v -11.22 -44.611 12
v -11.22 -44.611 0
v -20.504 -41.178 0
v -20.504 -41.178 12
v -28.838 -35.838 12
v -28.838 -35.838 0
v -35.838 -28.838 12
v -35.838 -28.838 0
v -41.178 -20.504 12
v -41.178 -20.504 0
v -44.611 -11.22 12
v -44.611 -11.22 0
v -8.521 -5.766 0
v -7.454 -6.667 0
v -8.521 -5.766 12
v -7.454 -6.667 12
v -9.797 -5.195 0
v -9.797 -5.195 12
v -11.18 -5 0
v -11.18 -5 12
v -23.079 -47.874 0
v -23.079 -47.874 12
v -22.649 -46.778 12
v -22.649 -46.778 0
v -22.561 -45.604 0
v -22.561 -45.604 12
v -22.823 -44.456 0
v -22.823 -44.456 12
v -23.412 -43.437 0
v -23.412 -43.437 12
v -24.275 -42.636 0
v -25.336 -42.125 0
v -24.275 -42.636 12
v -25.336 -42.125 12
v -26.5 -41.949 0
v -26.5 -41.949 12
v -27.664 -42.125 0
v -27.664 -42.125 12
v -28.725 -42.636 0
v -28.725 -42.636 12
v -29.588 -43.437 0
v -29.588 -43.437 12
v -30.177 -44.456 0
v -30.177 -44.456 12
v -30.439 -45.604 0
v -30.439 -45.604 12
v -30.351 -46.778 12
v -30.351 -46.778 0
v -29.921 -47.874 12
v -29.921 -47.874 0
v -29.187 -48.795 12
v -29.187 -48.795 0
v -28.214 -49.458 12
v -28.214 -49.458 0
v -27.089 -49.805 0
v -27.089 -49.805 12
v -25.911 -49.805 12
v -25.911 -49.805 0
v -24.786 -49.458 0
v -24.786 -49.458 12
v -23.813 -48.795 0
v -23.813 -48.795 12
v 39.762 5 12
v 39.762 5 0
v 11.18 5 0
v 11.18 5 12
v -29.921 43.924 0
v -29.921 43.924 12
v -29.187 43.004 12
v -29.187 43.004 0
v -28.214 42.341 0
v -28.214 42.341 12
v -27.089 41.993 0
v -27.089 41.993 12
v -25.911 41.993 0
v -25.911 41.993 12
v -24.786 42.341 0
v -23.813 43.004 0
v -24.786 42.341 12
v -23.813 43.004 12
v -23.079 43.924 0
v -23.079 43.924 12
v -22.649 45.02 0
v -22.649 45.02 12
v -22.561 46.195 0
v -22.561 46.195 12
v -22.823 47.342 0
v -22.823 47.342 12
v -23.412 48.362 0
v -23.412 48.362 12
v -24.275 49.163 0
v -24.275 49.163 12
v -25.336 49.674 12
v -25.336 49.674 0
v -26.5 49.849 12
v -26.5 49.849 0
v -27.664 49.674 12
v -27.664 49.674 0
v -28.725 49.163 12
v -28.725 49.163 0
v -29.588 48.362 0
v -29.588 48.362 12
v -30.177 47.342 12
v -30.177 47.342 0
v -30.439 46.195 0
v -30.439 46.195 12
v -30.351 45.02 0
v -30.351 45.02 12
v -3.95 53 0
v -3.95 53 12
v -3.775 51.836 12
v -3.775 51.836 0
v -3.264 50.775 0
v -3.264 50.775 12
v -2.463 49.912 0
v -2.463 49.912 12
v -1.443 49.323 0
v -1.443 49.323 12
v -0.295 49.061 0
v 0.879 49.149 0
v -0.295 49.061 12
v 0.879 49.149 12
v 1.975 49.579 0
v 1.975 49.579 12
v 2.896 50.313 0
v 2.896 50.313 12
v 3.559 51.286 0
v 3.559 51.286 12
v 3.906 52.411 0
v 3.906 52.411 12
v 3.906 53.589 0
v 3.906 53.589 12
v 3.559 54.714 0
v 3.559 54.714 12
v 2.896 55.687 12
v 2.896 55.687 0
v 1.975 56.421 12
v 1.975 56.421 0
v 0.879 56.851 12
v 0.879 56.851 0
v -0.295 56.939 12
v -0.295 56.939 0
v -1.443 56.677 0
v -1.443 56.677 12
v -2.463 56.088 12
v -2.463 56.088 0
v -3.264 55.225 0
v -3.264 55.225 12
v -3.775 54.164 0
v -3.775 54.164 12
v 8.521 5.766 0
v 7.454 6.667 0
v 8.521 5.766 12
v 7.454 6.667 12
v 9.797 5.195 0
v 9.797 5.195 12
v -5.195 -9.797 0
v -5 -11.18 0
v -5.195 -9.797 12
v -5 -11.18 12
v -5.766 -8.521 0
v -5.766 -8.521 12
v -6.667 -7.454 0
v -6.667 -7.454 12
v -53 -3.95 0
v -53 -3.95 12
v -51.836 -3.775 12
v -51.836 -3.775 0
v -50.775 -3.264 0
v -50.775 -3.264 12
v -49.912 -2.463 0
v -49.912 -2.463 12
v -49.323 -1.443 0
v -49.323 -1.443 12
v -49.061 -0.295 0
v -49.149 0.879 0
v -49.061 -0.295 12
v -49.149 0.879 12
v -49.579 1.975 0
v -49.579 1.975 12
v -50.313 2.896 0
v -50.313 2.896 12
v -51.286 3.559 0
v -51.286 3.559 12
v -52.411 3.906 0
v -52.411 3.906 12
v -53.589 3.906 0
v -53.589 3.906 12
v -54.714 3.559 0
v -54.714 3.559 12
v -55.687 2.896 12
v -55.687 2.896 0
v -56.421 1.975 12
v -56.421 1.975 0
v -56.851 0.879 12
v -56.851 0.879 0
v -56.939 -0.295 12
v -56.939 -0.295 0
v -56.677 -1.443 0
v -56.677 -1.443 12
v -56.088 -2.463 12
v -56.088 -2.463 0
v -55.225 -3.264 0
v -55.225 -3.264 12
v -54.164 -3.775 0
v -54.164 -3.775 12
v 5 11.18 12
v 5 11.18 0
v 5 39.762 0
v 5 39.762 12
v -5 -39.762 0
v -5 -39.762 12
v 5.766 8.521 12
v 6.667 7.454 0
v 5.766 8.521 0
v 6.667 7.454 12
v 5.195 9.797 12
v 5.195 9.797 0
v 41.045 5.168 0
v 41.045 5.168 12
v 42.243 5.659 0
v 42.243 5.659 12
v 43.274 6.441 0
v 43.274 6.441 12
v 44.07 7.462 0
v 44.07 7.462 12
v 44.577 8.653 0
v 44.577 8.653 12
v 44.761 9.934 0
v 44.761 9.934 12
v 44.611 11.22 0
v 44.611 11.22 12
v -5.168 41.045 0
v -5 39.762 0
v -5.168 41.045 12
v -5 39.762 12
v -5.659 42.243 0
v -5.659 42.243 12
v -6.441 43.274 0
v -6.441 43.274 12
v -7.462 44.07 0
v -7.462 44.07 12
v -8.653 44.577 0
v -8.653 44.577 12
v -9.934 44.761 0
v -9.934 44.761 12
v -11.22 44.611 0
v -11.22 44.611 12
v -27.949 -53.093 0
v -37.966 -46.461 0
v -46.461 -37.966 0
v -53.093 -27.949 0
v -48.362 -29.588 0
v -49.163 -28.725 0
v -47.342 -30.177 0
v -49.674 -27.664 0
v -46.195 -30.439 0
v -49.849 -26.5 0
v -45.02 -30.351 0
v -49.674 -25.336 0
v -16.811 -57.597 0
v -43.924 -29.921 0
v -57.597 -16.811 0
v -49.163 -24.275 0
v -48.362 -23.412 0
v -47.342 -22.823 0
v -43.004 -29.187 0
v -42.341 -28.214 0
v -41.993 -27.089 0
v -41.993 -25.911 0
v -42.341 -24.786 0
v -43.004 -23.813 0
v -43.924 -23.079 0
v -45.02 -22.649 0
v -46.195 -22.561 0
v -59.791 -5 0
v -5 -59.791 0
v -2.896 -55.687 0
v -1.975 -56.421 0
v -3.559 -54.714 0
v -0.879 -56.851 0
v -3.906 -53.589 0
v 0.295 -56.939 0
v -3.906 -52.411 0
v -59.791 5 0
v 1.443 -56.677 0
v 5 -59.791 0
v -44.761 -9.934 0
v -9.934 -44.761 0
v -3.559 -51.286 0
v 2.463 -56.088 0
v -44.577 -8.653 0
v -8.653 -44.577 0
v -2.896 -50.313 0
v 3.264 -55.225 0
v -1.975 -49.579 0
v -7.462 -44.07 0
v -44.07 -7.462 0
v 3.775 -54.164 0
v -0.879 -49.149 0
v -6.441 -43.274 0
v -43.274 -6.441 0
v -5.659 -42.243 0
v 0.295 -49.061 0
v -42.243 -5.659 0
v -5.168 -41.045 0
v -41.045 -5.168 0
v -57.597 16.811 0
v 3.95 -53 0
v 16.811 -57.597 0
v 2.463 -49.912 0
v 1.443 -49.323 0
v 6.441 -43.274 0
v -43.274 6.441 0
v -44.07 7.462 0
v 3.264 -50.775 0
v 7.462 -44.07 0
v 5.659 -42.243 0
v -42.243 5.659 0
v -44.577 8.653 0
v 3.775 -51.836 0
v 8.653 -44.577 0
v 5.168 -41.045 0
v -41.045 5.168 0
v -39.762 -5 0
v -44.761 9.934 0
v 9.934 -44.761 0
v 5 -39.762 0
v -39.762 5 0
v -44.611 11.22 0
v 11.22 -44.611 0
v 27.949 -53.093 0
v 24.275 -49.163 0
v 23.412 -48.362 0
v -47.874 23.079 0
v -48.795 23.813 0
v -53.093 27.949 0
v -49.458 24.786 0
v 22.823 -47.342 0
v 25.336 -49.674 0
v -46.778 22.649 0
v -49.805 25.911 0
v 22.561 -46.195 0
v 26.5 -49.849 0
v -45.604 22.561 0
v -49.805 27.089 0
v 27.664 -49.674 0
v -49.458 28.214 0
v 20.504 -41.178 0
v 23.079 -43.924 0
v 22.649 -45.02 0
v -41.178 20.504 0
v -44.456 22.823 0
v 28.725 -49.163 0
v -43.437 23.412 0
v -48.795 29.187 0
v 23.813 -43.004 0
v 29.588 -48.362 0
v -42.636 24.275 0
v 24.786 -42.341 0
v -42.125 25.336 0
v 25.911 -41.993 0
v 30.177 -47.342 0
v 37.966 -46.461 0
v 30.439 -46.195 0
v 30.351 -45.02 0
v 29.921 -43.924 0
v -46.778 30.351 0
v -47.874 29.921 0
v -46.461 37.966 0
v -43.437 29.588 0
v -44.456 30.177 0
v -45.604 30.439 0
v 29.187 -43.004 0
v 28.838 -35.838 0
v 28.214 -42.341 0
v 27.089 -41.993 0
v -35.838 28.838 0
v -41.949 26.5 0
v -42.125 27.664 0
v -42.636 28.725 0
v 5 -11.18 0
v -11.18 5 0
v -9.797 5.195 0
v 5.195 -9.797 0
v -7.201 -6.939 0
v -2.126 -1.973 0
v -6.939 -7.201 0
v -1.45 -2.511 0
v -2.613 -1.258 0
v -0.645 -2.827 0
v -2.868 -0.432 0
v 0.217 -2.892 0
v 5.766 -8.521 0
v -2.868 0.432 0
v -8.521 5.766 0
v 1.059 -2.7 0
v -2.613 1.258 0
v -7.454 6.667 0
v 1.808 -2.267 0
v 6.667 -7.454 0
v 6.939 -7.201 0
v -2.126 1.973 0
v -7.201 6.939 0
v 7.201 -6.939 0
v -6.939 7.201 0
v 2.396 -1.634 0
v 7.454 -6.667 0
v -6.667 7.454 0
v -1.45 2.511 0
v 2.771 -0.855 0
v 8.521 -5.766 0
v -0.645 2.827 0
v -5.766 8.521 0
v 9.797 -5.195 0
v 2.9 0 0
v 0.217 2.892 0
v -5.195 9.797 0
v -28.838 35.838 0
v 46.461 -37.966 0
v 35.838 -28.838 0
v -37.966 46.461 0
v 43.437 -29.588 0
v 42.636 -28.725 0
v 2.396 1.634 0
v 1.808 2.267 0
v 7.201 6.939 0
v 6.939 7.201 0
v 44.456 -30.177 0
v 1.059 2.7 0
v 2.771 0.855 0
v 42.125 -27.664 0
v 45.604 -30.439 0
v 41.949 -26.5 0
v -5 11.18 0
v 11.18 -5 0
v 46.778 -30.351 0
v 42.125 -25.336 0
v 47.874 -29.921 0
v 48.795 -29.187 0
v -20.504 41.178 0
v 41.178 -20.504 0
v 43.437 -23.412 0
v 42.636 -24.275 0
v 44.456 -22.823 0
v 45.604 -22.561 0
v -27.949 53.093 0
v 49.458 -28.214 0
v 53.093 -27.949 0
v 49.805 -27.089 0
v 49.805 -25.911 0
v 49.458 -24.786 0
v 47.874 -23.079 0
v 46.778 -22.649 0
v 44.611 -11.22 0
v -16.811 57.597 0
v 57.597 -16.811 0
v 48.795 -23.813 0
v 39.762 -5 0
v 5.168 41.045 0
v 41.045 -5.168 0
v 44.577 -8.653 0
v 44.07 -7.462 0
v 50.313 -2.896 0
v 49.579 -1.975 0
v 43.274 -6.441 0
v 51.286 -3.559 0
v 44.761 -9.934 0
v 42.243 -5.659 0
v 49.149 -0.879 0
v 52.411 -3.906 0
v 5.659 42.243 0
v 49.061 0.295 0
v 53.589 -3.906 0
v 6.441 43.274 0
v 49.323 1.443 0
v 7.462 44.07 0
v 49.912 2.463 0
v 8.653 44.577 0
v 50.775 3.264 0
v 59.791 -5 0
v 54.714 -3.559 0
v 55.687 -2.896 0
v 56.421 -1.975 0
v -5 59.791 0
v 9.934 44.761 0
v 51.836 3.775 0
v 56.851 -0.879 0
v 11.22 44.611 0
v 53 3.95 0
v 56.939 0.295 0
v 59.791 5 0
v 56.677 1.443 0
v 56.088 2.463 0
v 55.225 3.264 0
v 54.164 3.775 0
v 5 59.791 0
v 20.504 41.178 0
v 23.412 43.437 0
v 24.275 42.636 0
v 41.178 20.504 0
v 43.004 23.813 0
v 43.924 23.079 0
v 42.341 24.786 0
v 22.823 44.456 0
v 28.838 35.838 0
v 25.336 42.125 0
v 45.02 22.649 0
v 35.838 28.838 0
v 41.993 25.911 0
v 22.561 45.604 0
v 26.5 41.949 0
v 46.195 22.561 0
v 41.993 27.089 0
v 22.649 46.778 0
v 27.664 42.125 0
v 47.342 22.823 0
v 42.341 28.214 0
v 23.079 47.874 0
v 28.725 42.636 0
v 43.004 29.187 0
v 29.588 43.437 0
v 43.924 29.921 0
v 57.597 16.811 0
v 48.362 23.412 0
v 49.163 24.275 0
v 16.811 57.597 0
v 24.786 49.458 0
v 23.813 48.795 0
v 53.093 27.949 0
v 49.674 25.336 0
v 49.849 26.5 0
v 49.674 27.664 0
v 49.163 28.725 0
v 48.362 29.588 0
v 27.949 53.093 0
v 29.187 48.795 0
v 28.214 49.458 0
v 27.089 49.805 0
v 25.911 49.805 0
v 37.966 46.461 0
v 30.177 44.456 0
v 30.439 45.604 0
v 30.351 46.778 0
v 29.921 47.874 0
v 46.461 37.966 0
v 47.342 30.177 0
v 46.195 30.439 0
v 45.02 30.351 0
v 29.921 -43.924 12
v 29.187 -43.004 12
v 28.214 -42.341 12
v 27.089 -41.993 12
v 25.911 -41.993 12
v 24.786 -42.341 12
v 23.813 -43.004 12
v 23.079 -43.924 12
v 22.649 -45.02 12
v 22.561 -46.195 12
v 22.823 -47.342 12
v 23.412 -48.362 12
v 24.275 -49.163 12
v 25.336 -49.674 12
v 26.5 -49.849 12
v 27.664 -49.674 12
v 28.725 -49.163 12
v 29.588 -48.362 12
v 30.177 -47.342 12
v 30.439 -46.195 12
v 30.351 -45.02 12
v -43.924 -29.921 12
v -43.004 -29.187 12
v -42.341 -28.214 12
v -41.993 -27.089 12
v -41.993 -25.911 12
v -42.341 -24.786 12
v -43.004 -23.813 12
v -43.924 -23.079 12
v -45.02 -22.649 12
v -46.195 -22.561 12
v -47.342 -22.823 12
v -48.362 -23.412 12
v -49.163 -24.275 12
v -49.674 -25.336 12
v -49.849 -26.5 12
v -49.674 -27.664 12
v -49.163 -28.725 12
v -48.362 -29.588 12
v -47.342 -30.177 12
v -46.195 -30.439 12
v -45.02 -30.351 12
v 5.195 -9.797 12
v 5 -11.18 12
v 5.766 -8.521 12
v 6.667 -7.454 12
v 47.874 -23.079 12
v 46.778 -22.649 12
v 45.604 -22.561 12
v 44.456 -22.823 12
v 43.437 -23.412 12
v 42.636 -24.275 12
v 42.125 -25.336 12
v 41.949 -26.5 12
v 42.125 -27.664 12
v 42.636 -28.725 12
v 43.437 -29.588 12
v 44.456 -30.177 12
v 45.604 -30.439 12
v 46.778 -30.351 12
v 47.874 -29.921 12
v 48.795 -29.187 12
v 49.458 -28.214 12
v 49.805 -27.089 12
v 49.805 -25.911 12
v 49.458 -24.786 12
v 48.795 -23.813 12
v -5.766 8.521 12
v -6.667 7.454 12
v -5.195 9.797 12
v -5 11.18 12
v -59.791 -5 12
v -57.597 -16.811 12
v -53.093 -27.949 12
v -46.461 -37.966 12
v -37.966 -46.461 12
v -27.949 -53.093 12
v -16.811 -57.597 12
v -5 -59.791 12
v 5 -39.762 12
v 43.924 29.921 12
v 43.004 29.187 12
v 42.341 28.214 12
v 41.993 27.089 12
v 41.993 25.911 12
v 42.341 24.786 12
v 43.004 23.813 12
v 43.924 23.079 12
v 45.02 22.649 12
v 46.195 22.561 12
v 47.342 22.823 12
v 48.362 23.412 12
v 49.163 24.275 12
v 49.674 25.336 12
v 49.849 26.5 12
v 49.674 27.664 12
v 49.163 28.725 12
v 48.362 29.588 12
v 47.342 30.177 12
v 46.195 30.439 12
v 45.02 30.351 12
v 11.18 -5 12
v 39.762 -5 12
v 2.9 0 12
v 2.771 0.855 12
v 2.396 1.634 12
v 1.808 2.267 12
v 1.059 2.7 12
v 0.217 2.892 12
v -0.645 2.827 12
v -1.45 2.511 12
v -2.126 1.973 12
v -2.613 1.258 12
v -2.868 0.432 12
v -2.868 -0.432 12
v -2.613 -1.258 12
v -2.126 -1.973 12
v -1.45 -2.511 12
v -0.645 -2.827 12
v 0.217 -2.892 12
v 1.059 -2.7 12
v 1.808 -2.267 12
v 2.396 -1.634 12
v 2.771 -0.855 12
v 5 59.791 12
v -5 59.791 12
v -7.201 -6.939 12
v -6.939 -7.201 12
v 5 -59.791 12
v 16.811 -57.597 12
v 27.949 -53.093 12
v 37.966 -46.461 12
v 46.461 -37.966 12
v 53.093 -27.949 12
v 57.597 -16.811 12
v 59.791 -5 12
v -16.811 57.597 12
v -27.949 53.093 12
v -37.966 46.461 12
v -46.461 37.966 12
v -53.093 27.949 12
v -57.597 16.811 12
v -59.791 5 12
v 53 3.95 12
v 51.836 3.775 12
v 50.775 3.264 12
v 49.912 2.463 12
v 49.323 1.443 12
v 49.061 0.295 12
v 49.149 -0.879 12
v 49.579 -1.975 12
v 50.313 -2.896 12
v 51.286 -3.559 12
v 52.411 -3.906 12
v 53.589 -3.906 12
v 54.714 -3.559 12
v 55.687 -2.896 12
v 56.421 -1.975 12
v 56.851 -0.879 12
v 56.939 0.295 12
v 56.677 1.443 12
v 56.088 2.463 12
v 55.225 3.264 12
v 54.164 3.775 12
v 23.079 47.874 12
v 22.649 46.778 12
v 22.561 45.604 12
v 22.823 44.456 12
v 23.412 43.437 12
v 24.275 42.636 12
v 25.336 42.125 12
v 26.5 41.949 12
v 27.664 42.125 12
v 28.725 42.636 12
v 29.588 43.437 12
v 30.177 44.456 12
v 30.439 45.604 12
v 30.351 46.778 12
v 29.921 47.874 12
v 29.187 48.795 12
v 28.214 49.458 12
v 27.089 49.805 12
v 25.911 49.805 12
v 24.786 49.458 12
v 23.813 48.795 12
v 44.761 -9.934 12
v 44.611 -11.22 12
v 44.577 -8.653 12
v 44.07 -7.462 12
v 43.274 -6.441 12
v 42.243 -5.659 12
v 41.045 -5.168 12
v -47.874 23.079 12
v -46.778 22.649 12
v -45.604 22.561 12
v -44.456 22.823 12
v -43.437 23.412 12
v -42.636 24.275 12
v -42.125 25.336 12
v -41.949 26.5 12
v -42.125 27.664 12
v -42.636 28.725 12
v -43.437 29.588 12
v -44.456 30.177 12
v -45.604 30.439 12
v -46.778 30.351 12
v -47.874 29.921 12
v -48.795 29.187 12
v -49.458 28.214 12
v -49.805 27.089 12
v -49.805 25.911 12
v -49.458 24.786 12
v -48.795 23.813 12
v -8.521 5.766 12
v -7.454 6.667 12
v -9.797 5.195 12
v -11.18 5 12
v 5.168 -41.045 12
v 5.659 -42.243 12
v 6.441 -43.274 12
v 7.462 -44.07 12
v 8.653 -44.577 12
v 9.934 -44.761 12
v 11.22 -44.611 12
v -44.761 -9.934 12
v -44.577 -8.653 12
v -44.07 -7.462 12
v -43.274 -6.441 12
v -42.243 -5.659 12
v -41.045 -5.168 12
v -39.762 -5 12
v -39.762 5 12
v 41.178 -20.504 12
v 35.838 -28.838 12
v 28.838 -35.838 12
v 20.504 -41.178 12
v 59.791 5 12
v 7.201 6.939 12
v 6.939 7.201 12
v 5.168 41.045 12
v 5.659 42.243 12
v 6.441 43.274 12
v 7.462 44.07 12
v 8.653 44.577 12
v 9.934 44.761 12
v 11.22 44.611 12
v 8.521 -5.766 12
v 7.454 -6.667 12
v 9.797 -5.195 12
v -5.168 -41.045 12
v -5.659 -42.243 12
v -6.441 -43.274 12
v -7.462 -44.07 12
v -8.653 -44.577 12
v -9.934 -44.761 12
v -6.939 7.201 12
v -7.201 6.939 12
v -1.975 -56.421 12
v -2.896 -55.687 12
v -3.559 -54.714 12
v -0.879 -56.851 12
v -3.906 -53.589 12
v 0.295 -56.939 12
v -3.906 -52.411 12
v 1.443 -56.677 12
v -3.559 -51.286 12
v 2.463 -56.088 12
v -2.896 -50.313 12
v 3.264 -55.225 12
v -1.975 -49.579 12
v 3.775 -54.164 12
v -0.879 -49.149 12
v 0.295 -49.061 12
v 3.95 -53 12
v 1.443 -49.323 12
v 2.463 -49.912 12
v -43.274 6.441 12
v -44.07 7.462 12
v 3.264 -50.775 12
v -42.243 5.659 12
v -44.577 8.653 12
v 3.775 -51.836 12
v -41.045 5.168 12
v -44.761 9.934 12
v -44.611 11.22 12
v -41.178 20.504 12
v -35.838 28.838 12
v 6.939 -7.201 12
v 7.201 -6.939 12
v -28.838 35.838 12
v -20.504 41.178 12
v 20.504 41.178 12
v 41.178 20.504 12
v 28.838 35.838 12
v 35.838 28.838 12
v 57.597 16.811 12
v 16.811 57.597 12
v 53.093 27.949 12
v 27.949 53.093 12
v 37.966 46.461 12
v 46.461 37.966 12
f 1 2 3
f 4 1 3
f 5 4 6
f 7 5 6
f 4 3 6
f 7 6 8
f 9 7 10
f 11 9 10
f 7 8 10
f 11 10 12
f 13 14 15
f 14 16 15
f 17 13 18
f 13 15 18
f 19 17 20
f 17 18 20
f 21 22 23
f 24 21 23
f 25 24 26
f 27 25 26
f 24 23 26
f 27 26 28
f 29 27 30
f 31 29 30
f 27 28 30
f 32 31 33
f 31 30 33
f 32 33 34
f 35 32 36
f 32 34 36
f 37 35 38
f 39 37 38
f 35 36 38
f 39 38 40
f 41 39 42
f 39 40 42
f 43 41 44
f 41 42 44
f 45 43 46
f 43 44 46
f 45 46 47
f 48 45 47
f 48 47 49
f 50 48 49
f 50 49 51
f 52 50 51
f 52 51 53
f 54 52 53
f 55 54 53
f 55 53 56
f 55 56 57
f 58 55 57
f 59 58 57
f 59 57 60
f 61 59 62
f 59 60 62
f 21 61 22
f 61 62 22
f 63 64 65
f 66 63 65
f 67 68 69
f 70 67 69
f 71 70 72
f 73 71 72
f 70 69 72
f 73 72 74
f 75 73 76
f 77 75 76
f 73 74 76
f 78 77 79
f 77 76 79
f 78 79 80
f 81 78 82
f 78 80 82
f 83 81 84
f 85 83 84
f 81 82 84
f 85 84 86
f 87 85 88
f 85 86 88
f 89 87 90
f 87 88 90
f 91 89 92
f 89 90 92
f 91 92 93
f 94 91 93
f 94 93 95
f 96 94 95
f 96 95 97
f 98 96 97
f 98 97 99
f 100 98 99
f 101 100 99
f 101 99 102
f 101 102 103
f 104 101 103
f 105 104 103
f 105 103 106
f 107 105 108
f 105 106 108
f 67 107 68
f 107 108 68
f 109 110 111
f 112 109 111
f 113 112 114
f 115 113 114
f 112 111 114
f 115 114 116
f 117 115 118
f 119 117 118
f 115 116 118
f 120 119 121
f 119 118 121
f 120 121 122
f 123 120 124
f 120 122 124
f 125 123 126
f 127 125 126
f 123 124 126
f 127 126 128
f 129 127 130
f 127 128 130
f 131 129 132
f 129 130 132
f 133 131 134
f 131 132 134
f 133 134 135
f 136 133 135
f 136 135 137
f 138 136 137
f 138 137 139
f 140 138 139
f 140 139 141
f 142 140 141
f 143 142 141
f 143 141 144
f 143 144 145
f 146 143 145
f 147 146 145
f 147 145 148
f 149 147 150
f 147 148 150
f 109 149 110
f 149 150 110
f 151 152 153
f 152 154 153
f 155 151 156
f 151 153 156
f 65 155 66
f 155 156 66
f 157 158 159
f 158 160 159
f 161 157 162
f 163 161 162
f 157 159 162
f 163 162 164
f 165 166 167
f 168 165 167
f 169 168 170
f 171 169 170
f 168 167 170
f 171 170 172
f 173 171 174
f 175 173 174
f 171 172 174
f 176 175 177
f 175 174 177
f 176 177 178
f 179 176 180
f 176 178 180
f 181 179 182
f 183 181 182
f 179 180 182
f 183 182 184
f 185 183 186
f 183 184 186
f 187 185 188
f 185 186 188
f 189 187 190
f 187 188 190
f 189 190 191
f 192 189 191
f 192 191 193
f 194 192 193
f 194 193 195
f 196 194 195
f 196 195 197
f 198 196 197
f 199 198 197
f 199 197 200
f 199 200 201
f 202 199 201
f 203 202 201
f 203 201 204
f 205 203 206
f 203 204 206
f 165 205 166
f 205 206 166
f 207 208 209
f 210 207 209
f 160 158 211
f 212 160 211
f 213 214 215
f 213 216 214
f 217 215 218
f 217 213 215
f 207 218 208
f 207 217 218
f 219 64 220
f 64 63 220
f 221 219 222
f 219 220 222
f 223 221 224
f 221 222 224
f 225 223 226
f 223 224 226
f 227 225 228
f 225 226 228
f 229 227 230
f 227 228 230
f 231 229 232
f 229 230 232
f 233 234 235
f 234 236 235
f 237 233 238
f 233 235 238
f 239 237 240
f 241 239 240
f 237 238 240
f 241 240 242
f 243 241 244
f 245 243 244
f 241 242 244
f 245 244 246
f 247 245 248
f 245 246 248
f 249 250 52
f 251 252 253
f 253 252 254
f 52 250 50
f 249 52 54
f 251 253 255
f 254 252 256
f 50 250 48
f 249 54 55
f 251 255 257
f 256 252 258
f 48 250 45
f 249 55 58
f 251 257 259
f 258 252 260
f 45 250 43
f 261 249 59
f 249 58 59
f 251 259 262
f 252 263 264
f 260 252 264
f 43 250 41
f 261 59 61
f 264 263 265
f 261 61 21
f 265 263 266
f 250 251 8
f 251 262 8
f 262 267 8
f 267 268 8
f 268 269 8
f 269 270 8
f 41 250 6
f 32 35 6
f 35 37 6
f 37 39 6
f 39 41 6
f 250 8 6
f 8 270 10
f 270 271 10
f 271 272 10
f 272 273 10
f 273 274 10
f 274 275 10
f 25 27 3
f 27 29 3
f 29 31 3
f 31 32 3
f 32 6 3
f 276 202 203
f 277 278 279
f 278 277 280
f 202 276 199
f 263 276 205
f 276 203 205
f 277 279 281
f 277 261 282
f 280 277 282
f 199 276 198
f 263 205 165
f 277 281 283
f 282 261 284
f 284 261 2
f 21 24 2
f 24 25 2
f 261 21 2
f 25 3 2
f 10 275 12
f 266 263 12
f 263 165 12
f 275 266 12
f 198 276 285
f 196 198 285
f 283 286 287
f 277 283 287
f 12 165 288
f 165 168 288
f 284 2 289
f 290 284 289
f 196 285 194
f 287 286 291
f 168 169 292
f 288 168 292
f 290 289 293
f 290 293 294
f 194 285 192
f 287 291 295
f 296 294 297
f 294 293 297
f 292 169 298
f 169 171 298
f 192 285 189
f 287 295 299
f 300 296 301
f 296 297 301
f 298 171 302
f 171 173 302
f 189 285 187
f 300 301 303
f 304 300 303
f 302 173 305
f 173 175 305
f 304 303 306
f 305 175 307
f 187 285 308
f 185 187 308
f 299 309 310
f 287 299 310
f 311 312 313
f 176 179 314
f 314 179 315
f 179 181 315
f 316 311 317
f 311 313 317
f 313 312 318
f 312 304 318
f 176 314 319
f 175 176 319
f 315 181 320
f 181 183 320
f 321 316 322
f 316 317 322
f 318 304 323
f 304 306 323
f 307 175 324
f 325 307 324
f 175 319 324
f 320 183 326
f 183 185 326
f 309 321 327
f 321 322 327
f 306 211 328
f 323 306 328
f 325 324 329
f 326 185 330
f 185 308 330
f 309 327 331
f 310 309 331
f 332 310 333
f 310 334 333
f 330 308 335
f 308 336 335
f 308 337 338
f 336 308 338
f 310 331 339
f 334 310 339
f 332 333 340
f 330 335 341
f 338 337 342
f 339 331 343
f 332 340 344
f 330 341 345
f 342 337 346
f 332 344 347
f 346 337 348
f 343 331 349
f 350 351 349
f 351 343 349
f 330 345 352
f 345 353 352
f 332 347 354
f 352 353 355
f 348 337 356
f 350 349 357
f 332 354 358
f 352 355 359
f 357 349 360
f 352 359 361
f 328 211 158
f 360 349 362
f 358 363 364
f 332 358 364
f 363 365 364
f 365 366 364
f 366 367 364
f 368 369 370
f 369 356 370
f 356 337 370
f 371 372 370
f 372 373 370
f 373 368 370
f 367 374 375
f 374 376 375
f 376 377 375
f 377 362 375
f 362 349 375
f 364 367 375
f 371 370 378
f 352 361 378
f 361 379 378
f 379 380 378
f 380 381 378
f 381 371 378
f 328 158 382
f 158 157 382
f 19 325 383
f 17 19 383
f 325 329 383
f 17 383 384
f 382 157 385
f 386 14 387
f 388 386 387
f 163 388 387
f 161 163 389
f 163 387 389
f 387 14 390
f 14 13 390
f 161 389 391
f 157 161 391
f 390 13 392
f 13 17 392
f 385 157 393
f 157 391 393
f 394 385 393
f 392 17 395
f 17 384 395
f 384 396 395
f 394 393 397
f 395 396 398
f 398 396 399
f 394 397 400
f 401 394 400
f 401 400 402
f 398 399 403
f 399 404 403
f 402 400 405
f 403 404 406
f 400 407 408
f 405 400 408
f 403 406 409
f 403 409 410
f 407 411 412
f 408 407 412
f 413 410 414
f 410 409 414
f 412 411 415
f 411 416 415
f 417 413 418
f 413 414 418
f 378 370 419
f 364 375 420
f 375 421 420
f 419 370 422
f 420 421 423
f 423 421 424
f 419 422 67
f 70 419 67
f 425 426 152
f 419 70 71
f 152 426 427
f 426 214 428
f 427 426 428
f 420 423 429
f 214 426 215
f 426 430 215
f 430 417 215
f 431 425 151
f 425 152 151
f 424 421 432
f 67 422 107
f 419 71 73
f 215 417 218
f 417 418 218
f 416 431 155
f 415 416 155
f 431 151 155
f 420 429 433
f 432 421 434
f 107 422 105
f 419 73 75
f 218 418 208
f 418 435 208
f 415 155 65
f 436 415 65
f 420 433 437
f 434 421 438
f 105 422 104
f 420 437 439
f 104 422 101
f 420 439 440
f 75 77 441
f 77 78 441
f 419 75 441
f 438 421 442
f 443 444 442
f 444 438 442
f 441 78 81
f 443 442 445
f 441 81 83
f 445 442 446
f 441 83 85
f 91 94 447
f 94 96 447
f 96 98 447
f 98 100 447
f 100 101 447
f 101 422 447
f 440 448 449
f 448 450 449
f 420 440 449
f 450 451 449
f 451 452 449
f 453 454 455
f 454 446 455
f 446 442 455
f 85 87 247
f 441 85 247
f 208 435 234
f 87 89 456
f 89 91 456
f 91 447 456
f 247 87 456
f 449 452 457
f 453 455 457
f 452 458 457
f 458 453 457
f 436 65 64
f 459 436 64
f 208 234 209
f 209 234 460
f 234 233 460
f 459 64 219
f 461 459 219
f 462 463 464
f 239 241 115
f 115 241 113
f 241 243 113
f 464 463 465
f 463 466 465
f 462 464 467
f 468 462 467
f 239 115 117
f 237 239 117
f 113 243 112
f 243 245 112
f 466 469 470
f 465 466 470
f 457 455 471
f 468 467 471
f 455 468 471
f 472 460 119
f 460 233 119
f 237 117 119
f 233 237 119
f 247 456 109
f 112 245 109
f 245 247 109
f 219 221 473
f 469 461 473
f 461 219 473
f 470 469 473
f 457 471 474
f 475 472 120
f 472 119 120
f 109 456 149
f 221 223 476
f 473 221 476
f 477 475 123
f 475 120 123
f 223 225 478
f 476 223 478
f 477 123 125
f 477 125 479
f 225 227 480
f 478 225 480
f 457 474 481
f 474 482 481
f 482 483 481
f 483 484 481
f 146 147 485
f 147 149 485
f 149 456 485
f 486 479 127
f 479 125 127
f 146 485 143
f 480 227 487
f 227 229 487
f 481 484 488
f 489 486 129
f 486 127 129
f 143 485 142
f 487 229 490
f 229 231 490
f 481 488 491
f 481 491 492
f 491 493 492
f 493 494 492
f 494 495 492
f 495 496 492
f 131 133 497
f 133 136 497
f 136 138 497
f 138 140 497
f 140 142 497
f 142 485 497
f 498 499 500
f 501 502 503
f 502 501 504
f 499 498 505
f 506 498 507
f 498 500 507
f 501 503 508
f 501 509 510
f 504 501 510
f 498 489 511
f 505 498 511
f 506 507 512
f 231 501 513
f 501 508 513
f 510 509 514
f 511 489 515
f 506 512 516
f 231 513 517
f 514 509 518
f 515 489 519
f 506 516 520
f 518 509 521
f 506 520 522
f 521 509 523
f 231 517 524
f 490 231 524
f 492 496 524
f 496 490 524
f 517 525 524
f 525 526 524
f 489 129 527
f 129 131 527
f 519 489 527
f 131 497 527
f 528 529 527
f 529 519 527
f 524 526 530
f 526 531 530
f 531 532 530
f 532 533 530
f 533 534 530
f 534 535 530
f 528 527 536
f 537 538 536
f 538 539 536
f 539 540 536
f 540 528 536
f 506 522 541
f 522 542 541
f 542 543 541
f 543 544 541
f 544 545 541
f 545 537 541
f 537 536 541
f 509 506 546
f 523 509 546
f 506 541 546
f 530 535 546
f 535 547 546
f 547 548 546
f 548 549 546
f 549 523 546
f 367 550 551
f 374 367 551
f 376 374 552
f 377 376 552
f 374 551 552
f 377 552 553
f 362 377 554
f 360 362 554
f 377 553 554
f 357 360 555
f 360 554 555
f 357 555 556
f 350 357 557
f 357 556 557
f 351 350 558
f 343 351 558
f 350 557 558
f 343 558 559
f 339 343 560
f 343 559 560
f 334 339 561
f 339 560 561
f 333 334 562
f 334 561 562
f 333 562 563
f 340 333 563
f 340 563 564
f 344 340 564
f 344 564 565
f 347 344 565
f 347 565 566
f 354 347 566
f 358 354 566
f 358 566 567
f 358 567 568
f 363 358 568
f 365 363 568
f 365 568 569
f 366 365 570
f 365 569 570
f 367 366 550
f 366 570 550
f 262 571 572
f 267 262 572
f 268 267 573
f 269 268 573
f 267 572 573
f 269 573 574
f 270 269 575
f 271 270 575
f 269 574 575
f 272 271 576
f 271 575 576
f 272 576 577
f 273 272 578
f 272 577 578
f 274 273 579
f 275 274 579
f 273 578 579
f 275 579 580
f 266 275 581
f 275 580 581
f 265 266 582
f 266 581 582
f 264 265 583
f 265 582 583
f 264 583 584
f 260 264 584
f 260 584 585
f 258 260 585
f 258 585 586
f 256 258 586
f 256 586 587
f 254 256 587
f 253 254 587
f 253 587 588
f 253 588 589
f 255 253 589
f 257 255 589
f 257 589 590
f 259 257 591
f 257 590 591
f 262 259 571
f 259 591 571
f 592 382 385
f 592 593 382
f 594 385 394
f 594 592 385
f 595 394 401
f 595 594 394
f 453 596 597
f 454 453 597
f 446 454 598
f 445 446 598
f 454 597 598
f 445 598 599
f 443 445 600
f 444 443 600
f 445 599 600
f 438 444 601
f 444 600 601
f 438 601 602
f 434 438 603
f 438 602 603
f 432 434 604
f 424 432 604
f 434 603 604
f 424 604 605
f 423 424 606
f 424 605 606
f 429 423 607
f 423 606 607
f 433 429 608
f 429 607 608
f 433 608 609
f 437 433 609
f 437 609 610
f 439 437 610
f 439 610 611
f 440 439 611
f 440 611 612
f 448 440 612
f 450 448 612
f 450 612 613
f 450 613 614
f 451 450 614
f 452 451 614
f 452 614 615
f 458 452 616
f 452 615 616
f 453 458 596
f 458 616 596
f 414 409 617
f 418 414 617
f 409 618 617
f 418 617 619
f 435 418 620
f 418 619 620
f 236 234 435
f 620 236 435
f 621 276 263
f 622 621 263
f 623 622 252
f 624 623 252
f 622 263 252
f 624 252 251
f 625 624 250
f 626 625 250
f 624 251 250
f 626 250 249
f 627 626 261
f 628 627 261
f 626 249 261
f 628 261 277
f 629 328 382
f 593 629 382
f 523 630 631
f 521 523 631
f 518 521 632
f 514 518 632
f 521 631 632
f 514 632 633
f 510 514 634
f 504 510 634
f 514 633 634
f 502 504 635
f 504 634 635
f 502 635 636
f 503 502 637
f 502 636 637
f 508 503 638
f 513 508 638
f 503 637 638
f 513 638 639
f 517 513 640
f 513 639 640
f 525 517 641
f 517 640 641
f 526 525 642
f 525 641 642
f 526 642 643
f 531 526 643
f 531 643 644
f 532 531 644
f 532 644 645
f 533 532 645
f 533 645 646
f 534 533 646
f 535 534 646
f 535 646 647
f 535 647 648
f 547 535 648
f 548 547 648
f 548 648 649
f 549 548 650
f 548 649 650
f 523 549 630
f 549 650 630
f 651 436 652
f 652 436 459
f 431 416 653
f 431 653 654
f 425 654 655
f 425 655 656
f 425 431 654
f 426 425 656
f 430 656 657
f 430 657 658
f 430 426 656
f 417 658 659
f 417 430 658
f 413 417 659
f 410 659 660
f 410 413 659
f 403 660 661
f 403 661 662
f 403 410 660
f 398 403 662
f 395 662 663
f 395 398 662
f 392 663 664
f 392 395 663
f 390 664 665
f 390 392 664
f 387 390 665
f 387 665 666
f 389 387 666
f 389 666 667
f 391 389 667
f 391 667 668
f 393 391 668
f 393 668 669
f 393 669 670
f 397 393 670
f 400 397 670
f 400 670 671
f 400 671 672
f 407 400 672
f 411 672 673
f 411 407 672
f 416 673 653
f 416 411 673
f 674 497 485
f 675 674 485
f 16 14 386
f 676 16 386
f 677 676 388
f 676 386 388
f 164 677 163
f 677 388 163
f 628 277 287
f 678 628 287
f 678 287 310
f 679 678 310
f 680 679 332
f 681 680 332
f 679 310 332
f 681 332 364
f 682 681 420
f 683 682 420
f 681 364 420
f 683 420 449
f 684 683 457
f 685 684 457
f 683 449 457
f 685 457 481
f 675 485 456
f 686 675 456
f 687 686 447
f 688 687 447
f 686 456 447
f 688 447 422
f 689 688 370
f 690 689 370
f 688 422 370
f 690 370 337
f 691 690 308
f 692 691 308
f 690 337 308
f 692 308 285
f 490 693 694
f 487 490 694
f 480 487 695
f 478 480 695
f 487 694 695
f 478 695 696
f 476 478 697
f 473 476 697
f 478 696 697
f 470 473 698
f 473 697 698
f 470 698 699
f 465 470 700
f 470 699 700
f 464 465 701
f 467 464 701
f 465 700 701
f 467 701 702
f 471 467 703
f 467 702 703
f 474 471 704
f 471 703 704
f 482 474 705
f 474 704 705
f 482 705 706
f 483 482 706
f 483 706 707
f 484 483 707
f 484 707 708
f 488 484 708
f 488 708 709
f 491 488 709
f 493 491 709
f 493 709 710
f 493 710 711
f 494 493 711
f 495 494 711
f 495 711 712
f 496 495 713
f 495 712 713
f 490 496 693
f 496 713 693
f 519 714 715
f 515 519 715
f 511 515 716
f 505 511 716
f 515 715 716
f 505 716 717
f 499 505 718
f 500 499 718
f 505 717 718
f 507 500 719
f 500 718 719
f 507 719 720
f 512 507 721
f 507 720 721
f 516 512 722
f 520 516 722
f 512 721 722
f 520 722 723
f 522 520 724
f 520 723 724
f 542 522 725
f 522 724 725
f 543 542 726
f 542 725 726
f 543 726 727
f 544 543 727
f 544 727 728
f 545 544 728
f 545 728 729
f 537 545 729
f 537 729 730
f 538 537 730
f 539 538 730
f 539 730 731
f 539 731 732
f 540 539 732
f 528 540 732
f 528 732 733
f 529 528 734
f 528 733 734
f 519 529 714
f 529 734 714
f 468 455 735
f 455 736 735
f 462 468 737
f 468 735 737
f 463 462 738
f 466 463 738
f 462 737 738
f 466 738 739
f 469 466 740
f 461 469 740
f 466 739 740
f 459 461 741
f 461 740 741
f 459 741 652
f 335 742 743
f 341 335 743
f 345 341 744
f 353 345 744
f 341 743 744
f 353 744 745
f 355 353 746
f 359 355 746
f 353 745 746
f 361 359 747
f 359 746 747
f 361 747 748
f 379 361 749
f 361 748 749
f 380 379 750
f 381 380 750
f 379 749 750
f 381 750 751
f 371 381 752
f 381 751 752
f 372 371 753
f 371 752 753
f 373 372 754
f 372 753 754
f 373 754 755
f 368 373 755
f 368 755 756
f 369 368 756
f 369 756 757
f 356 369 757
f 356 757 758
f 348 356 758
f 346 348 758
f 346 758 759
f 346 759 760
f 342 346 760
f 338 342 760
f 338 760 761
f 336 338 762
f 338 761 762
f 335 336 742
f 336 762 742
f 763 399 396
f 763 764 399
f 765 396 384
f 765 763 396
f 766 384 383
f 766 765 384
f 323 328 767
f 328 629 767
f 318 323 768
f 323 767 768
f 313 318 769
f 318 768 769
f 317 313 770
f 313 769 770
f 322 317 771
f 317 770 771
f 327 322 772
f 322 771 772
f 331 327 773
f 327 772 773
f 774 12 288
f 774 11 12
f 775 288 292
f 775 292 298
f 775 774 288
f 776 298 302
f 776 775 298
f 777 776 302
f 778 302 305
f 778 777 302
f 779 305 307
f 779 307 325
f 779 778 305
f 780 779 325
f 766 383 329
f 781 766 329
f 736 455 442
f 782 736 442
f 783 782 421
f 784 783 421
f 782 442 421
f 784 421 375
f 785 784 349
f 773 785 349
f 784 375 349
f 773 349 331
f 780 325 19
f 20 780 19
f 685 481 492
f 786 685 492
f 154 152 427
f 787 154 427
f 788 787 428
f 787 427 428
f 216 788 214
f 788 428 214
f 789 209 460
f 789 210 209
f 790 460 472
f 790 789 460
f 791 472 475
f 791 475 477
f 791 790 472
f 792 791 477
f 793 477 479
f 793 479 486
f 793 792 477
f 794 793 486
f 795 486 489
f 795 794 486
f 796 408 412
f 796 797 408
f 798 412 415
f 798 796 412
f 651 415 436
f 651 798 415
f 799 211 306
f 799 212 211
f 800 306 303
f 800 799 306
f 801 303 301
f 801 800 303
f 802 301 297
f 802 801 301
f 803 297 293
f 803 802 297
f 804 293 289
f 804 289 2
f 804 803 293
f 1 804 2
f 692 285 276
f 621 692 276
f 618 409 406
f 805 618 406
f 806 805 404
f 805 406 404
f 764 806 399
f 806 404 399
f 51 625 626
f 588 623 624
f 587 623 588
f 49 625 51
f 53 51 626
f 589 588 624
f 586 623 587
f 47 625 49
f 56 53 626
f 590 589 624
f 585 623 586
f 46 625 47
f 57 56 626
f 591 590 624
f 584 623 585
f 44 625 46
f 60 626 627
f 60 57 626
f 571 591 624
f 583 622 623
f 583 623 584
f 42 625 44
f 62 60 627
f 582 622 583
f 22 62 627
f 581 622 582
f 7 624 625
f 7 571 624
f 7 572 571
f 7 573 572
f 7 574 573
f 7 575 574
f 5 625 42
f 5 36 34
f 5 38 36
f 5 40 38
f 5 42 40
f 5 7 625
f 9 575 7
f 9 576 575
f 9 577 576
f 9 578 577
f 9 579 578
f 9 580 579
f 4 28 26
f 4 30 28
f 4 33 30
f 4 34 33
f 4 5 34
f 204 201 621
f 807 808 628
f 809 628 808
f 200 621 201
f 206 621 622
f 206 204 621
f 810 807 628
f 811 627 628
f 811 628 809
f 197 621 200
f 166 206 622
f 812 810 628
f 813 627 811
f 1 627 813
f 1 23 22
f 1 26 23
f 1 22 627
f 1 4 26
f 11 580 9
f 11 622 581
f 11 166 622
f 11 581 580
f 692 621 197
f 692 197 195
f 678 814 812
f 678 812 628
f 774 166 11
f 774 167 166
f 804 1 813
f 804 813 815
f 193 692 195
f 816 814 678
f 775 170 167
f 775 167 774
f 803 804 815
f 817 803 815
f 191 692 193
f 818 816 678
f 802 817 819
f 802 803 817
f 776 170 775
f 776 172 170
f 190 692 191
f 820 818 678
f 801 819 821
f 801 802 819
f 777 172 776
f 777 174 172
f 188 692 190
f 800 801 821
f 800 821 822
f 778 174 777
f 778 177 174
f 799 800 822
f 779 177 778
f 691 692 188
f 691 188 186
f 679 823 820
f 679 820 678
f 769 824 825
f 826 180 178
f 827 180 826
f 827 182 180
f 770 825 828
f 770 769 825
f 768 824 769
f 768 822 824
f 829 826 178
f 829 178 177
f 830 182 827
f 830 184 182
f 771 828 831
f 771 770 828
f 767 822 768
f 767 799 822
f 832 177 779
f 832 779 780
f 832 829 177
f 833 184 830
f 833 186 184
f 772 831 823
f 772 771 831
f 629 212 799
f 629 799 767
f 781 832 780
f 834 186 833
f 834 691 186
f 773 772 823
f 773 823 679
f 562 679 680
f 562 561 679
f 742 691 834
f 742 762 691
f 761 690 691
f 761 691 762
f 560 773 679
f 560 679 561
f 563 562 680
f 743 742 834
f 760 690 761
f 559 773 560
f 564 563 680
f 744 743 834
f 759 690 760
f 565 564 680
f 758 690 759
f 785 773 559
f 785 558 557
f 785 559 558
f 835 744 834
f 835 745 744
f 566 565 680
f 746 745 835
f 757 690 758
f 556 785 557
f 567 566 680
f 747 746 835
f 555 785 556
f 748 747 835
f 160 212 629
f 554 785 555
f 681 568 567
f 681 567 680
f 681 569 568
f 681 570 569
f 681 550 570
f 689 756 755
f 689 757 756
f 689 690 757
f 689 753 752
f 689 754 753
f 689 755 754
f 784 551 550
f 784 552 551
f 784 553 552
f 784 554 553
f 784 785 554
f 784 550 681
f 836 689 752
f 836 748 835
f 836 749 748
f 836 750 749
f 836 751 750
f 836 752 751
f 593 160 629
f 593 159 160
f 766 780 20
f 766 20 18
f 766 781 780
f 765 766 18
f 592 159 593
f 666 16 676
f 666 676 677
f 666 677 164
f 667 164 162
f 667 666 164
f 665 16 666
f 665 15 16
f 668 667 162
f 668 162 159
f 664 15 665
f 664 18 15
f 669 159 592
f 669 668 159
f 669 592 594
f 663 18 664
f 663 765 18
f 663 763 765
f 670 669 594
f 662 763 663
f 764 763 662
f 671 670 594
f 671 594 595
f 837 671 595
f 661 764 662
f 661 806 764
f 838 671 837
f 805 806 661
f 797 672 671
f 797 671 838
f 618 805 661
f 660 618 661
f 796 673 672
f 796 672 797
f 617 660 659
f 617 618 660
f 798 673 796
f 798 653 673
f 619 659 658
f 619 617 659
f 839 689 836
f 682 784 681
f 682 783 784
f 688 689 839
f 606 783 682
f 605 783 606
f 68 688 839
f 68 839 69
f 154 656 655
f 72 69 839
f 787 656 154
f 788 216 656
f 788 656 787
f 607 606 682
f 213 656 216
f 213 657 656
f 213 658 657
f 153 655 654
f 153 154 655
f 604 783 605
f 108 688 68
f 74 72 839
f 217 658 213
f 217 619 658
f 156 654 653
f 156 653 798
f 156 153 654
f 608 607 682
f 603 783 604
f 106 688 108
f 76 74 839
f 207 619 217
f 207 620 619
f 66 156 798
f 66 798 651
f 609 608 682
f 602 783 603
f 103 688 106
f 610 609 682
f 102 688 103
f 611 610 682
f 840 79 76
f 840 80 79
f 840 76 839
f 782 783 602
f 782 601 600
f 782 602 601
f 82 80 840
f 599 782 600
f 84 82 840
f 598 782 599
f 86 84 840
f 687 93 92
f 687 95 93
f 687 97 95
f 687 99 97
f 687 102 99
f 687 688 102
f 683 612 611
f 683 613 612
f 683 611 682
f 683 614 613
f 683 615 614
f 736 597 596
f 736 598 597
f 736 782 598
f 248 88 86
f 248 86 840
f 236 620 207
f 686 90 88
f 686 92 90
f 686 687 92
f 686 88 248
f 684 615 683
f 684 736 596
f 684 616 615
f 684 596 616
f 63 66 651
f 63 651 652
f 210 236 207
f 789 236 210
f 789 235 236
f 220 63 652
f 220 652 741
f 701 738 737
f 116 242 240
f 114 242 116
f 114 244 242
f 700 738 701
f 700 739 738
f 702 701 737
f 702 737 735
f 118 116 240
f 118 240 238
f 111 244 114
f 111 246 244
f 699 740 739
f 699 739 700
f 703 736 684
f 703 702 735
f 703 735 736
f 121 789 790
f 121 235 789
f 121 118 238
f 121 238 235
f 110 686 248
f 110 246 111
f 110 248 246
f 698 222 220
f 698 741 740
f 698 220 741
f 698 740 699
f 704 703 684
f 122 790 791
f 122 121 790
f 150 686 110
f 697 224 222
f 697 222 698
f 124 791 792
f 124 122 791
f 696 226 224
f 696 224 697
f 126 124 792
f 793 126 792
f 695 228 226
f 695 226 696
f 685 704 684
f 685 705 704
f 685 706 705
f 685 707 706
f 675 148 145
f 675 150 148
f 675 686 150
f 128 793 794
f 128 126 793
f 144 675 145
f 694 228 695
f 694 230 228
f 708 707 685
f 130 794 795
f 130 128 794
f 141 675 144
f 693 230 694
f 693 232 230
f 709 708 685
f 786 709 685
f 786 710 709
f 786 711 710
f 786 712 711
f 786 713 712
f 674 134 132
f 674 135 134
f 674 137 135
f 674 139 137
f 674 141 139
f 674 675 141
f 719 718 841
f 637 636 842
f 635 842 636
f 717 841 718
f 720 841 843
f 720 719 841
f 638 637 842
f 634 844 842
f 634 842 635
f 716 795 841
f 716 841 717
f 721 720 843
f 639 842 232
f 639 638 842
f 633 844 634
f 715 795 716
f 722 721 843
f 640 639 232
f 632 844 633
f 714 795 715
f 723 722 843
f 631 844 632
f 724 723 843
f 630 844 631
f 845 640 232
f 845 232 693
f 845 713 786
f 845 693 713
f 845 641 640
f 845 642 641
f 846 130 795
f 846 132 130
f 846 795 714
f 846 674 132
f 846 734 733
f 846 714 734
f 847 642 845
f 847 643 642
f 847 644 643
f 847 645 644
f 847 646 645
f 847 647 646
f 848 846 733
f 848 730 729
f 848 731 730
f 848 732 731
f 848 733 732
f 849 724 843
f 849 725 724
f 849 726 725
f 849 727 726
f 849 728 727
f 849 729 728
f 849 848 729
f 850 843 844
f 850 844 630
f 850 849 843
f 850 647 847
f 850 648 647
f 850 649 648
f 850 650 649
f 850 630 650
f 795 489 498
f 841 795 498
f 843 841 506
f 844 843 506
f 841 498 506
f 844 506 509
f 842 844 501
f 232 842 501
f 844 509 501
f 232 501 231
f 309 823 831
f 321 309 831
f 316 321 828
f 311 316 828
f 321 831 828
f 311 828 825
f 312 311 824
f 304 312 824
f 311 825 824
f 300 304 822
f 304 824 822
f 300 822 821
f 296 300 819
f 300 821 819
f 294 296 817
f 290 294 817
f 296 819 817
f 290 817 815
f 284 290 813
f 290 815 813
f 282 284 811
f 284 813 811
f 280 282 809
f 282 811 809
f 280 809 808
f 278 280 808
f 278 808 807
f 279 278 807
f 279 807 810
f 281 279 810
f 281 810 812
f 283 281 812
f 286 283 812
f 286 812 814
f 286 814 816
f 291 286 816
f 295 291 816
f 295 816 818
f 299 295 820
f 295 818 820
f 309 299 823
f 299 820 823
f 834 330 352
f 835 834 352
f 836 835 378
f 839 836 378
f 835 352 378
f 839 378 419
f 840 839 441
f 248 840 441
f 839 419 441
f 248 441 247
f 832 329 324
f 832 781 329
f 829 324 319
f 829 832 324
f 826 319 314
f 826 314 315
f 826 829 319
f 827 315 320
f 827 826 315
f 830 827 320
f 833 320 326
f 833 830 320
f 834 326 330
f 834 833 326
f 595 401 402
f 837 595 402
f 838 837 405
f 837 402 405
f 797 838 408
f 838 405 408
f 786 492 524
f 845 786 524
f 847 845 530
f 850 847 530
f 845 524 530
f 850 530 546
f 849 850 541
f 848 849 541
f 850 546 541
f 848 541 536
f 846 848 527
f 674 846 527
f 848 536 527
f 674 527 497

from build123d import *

# Parameters (mm, degrees)
SKIZZE1_W                       = 10
SKIZZE1_H                       = 10
SKIZZE1_R                       = 2.9
AUFSATZ_LINEAR_AUSTRAGEN3_DEPTH = 12
SKIZZE2_R                       = 3.95
SCHNITT_LINEAR_AUSTRAGEN1_DEPTH = 12
KREISMUSTER1_COUNT              = 12
VERRUNDUNG1_R                   = 5


with BuildPart() as part:
    # Skizze1 → Aufsatz-Linear austragen3 (new body)
    with BuildSketch(Plane.XY):
        with BuildLine():
            Line((-59.791303716, 5), (-59.791303716, -5))
            Line((-59.791303716, -5), (-45.727453461, -5))
            ThreePointArc((-45.727453461, -5), (-46, 0), (-45.727453461, 5))
            Line((-45.727453461, 5), (-59.791303716, 5))
        make_face()
        with BuildLine():
            ThreePointArc((-45.727453461, 5), (-46, 0), (-45.727453461, -5))
            Line((-45.727453461, -5), (-8.660254038, -5))
            ThreePointArc((-8.660254038, -5), (-10, 0), (-8.660254038, 5))
            Line((-8.660254038, 5), (-45.727453461, 5))
        make_face()
        with BuildLine():
            Line((8.660254038, -5), (45.727453461, -5))
            ThreePointArc((45.727453461, -5), (45.931812827, -2.503711326), (46, 0))
            ThreePointArc((46, 0), (45.931812827, 2.503711326), (45.727453461, 5))
            Line((45.727453461, 5), (8.660254038, 5))
            ThreePointArc((8.660254038, 5), (9.659258263, 2.588190451), (10, 0))
            ThreePointArc((10, 0), (9.659258263, -2.588190451), (8.660254038, -5))
        make_face()
        Rectangle(SKIZZE1_W, SKIZZE1_H)
        Circle(SKIZZE1_R, mode=Mode.SUBTRACT)
        with BuildLine():
            ThreePointArc((-8.660254038, 5), (-10, 0), (-8.660254038, -5))
            Line((-8.660254038, -5), (-5, -5))
            Line((-5, -5), (-5, 5))
            Line((-5, 5), (-8.660254038, 5))
        make_face()
        with BuildLine():
            ThreePointArc((-5, 8.660254038), (-7.071067812, 7.071067812), (-8.660254038, 5))
            Line((-8.660254038, 5), (-5, 5))
            Line((-5, 5), (-5, 8.660254038))
        make_face()
        with BuildLine():
            Line((-5, 8.660254038), (-5, 5))
            Line((-5, 5), (5, 5))
            Line((5, 5), (5, 8.660254038))
            ThreePointArc((5, 8.660254038), (0, 10), (-5, 8.660254038))
        make_face()
        with BuildLine():
            Line((5, 8.660254038), (5, 5))
            Line((5, 5), (8.660254038, 5))
            ThreePointArc((8.660254038, 5), (7.071067812, 7.071067812), (5, 8.660254038))
        make_face()
        with BuildLine():
            Line((5, 5), (5, -5))
            Line((5, -5), (8.660254038, -5))
            ThreePointArc((8.660254038, -5), (9.659258263, -2.588190451), (10, 0))
            ThreePointArc((10, 0), (9.659258263, 2.588190451), (8.660254038, 5))
            Line((8.660254038, 5), (5, 5))
        make_face()
        with BuildLine():
            Line((45.727453461, -5), (59.791303716, -5))
            Line((59.791303716, -5), (59.791303716, 5))
            Line((59.791303716, 5), (45.727453461, 5))
            ThreePointArc((45.727453461, 5), (45.931812827, 2.503711326), (46, 0))
            ThreePointArc((46, 0), (45.931812827, -2.503711326), (45.727453461, -5))
        make_face()
        with BuildLine():
            ThreePointArc((59.791303716, 5), (42.426406871, 42.426406871), (5, 59.791303716))
            Line((5, 59.791303716), (5, 45.727453461))
            ThreePointArc((5, 45.727453461), (32.526911935, 32.526911935), (45.727453461, 5))
            Line((45.727453461, 5), (59.791303716, 5))
        make_face()
        with BuildLine():
            Line((5, 59.791303716), (-5, 59.791303716))
            Line((-5, 59.791303716), (-5, 45.727453461))
            ThreePointArc((-5, 45.727453461), (0, 46), (5, 45.727453461))
            Line((5, 45.727453461), (5, 59.791303716))
        make_face()
        with BuildLine():
            ThreePointArc((-5, 59.791303716), (-42.426406871, 42.426406871), (-59.791303716, 5))
            Line((-59.791303716, 5), (-45.727453461, 5))
            ThreePointArc((-45.727453461, 5), (-32.526911935, 32.526911935), (-5, 45.727453461))
            Line((-5, 45.727453461), (-5, 59.791303716))
        make_face()
        with BuildLine():
            Line((-5, -8.660254038), (-5, -45.727453461))
            ThreePointArc((-5, -45.727453461), (0, -46), (5, -45.727453461))
            Line((5, -45.727453461), (5, -8.660254038))
            ThreePointArc((5, -8.660254038), (0, -10), (-5, -8.660254038))
        make_face()
        with BuildLine():
            ThreePointArc((5, 45.727453461), (0, 46), (-5, 45.727453461))
            Line((-5, 45.727453461), (-5, 8.660254038))
            ThreePointArc((-5, 8.660254038), (0, 10), (5, 8.660254038))
            Line((5, 8.660254038), (5, 45.727453461))
        make_face()
        with BuildLine():
            Line((-5, -5), (-8.660254038, -5))
            ThreePointArc((-8.660254038, -5), (-7.071067812, -7.071067812), (-5, -8.660254038))
            Line((-5, -8.660254038), (-5, -5))
        make_face()
        with BuildLine():
            Line((5, -5), (-5, -5))
            Line((-5, -5), (-5, -8.660254038))
            ThreePointArc((-5, -8.660254038), (0, -10), (5, -8.660254038))
            Line((5, -8.660254038), (5, -5))
        make_face()
        with BuildLine():
            Line((8.660254038, -5), (5, -5))
            Line((5, -5), (5, -8.660254038))
            ThreePointArc((5, -8.660254038), (7.071067812, -7.071067812), (8.660254038, -5))
        make_face()
        with BuildLine():
            Line((-45.727453461, -5), (-59.791303716, -5))
            ThreePointArc((-59.791303716, -5), (-42.426406871, -42.426406871), (-5, -59.791303716))
            Line((-5, -59.791303716), (-5, -45.727453461))
            ThreePointArc((-5, -45.727453461), (-32.526911935, -32.526911935), (-45.727453461, -5))
        make_face()
        with BuildLine():
            Line((-5, -45.727453461), (-5, -59.791303716))
            Line((-5, -59.791303716), (5, -59.791303716))
            Line((5, -59.791303716), (5, -45.727453461))
            ThreePointArc((5, -45.727453461), (0, -46), (-5, -45.727453461))
        make_face()
        with BuildLine():
            Line((5, -45.727453461), (5, -59.791303716))
            ThreePointArc((5, -59.791303716), (42.426406871, -42.426406871), (59.791303716, -5))
            Line((59.791303716, -5), (45.727453461, -5))
            ThreePointArc((45.727453461, -5), (32.526911935, -32.526911935), (5, -45.727453461))
        make_face()
    extrude(amount=AUFSATZ_LINEAR_AUSTRAGEN3_DEPTH)

    # Skizze2 → Schnitt-Linear austragen1 (cut)
    with BuildSketch(Plane.XY.offset(12)):
        with Locations((0, -53)):
            Circle(SKIZZE2_R)
    schnitt_linear_austragen1 = extrude(amount=-SCHNITT_LINEAR_AUSTRAGEN1_DEPTH, mode=Mode.SUBTRACT)

    # Kreismuster1: Schnitt-Linear austragen1 ×12 about axis
    kreismuster1_axis = Axis((0, 0, 0), (0, 0, 1))
    for i in range(1, KREISMUSTER1_COUNT):
        add(schnitt_linear_austragen1.rotate(kreismuster1_axis, i * 360 / KREISMUSTER1_COUNT), mode=Mode.SUBTRACT)

    # Verrundung1
    verrundung1_edges = [part.edges().sort_by_distance(p)[0] for p in [
        (-8.660254038, -5, 6),
        (-45.727453461, -5, 6),
        (-5, -45.727453461, 6),
        (-5, -8.660254038, 6),
        (-5, 45.727453461, 6),
        (-45.727453461, 5, 6),
        (-8.660254038, 5, 6),
        (-5, 8.660254038, 6),
        (45.727453461, 5, 6),
        (5, 45.727453461, 6),
        (5, 8.660254038, 6),
        (8.660254038, 5, 6),
        (5, -8.660254038, 6),
        (5, -45.727453461, 6),
        (45.727453461, -5, 6),
        (8.660254038, -5, 6),
    ]]
    fillet(verrundung1_edges, radius=VERRUNDUNG1_R)


solid = part.part
